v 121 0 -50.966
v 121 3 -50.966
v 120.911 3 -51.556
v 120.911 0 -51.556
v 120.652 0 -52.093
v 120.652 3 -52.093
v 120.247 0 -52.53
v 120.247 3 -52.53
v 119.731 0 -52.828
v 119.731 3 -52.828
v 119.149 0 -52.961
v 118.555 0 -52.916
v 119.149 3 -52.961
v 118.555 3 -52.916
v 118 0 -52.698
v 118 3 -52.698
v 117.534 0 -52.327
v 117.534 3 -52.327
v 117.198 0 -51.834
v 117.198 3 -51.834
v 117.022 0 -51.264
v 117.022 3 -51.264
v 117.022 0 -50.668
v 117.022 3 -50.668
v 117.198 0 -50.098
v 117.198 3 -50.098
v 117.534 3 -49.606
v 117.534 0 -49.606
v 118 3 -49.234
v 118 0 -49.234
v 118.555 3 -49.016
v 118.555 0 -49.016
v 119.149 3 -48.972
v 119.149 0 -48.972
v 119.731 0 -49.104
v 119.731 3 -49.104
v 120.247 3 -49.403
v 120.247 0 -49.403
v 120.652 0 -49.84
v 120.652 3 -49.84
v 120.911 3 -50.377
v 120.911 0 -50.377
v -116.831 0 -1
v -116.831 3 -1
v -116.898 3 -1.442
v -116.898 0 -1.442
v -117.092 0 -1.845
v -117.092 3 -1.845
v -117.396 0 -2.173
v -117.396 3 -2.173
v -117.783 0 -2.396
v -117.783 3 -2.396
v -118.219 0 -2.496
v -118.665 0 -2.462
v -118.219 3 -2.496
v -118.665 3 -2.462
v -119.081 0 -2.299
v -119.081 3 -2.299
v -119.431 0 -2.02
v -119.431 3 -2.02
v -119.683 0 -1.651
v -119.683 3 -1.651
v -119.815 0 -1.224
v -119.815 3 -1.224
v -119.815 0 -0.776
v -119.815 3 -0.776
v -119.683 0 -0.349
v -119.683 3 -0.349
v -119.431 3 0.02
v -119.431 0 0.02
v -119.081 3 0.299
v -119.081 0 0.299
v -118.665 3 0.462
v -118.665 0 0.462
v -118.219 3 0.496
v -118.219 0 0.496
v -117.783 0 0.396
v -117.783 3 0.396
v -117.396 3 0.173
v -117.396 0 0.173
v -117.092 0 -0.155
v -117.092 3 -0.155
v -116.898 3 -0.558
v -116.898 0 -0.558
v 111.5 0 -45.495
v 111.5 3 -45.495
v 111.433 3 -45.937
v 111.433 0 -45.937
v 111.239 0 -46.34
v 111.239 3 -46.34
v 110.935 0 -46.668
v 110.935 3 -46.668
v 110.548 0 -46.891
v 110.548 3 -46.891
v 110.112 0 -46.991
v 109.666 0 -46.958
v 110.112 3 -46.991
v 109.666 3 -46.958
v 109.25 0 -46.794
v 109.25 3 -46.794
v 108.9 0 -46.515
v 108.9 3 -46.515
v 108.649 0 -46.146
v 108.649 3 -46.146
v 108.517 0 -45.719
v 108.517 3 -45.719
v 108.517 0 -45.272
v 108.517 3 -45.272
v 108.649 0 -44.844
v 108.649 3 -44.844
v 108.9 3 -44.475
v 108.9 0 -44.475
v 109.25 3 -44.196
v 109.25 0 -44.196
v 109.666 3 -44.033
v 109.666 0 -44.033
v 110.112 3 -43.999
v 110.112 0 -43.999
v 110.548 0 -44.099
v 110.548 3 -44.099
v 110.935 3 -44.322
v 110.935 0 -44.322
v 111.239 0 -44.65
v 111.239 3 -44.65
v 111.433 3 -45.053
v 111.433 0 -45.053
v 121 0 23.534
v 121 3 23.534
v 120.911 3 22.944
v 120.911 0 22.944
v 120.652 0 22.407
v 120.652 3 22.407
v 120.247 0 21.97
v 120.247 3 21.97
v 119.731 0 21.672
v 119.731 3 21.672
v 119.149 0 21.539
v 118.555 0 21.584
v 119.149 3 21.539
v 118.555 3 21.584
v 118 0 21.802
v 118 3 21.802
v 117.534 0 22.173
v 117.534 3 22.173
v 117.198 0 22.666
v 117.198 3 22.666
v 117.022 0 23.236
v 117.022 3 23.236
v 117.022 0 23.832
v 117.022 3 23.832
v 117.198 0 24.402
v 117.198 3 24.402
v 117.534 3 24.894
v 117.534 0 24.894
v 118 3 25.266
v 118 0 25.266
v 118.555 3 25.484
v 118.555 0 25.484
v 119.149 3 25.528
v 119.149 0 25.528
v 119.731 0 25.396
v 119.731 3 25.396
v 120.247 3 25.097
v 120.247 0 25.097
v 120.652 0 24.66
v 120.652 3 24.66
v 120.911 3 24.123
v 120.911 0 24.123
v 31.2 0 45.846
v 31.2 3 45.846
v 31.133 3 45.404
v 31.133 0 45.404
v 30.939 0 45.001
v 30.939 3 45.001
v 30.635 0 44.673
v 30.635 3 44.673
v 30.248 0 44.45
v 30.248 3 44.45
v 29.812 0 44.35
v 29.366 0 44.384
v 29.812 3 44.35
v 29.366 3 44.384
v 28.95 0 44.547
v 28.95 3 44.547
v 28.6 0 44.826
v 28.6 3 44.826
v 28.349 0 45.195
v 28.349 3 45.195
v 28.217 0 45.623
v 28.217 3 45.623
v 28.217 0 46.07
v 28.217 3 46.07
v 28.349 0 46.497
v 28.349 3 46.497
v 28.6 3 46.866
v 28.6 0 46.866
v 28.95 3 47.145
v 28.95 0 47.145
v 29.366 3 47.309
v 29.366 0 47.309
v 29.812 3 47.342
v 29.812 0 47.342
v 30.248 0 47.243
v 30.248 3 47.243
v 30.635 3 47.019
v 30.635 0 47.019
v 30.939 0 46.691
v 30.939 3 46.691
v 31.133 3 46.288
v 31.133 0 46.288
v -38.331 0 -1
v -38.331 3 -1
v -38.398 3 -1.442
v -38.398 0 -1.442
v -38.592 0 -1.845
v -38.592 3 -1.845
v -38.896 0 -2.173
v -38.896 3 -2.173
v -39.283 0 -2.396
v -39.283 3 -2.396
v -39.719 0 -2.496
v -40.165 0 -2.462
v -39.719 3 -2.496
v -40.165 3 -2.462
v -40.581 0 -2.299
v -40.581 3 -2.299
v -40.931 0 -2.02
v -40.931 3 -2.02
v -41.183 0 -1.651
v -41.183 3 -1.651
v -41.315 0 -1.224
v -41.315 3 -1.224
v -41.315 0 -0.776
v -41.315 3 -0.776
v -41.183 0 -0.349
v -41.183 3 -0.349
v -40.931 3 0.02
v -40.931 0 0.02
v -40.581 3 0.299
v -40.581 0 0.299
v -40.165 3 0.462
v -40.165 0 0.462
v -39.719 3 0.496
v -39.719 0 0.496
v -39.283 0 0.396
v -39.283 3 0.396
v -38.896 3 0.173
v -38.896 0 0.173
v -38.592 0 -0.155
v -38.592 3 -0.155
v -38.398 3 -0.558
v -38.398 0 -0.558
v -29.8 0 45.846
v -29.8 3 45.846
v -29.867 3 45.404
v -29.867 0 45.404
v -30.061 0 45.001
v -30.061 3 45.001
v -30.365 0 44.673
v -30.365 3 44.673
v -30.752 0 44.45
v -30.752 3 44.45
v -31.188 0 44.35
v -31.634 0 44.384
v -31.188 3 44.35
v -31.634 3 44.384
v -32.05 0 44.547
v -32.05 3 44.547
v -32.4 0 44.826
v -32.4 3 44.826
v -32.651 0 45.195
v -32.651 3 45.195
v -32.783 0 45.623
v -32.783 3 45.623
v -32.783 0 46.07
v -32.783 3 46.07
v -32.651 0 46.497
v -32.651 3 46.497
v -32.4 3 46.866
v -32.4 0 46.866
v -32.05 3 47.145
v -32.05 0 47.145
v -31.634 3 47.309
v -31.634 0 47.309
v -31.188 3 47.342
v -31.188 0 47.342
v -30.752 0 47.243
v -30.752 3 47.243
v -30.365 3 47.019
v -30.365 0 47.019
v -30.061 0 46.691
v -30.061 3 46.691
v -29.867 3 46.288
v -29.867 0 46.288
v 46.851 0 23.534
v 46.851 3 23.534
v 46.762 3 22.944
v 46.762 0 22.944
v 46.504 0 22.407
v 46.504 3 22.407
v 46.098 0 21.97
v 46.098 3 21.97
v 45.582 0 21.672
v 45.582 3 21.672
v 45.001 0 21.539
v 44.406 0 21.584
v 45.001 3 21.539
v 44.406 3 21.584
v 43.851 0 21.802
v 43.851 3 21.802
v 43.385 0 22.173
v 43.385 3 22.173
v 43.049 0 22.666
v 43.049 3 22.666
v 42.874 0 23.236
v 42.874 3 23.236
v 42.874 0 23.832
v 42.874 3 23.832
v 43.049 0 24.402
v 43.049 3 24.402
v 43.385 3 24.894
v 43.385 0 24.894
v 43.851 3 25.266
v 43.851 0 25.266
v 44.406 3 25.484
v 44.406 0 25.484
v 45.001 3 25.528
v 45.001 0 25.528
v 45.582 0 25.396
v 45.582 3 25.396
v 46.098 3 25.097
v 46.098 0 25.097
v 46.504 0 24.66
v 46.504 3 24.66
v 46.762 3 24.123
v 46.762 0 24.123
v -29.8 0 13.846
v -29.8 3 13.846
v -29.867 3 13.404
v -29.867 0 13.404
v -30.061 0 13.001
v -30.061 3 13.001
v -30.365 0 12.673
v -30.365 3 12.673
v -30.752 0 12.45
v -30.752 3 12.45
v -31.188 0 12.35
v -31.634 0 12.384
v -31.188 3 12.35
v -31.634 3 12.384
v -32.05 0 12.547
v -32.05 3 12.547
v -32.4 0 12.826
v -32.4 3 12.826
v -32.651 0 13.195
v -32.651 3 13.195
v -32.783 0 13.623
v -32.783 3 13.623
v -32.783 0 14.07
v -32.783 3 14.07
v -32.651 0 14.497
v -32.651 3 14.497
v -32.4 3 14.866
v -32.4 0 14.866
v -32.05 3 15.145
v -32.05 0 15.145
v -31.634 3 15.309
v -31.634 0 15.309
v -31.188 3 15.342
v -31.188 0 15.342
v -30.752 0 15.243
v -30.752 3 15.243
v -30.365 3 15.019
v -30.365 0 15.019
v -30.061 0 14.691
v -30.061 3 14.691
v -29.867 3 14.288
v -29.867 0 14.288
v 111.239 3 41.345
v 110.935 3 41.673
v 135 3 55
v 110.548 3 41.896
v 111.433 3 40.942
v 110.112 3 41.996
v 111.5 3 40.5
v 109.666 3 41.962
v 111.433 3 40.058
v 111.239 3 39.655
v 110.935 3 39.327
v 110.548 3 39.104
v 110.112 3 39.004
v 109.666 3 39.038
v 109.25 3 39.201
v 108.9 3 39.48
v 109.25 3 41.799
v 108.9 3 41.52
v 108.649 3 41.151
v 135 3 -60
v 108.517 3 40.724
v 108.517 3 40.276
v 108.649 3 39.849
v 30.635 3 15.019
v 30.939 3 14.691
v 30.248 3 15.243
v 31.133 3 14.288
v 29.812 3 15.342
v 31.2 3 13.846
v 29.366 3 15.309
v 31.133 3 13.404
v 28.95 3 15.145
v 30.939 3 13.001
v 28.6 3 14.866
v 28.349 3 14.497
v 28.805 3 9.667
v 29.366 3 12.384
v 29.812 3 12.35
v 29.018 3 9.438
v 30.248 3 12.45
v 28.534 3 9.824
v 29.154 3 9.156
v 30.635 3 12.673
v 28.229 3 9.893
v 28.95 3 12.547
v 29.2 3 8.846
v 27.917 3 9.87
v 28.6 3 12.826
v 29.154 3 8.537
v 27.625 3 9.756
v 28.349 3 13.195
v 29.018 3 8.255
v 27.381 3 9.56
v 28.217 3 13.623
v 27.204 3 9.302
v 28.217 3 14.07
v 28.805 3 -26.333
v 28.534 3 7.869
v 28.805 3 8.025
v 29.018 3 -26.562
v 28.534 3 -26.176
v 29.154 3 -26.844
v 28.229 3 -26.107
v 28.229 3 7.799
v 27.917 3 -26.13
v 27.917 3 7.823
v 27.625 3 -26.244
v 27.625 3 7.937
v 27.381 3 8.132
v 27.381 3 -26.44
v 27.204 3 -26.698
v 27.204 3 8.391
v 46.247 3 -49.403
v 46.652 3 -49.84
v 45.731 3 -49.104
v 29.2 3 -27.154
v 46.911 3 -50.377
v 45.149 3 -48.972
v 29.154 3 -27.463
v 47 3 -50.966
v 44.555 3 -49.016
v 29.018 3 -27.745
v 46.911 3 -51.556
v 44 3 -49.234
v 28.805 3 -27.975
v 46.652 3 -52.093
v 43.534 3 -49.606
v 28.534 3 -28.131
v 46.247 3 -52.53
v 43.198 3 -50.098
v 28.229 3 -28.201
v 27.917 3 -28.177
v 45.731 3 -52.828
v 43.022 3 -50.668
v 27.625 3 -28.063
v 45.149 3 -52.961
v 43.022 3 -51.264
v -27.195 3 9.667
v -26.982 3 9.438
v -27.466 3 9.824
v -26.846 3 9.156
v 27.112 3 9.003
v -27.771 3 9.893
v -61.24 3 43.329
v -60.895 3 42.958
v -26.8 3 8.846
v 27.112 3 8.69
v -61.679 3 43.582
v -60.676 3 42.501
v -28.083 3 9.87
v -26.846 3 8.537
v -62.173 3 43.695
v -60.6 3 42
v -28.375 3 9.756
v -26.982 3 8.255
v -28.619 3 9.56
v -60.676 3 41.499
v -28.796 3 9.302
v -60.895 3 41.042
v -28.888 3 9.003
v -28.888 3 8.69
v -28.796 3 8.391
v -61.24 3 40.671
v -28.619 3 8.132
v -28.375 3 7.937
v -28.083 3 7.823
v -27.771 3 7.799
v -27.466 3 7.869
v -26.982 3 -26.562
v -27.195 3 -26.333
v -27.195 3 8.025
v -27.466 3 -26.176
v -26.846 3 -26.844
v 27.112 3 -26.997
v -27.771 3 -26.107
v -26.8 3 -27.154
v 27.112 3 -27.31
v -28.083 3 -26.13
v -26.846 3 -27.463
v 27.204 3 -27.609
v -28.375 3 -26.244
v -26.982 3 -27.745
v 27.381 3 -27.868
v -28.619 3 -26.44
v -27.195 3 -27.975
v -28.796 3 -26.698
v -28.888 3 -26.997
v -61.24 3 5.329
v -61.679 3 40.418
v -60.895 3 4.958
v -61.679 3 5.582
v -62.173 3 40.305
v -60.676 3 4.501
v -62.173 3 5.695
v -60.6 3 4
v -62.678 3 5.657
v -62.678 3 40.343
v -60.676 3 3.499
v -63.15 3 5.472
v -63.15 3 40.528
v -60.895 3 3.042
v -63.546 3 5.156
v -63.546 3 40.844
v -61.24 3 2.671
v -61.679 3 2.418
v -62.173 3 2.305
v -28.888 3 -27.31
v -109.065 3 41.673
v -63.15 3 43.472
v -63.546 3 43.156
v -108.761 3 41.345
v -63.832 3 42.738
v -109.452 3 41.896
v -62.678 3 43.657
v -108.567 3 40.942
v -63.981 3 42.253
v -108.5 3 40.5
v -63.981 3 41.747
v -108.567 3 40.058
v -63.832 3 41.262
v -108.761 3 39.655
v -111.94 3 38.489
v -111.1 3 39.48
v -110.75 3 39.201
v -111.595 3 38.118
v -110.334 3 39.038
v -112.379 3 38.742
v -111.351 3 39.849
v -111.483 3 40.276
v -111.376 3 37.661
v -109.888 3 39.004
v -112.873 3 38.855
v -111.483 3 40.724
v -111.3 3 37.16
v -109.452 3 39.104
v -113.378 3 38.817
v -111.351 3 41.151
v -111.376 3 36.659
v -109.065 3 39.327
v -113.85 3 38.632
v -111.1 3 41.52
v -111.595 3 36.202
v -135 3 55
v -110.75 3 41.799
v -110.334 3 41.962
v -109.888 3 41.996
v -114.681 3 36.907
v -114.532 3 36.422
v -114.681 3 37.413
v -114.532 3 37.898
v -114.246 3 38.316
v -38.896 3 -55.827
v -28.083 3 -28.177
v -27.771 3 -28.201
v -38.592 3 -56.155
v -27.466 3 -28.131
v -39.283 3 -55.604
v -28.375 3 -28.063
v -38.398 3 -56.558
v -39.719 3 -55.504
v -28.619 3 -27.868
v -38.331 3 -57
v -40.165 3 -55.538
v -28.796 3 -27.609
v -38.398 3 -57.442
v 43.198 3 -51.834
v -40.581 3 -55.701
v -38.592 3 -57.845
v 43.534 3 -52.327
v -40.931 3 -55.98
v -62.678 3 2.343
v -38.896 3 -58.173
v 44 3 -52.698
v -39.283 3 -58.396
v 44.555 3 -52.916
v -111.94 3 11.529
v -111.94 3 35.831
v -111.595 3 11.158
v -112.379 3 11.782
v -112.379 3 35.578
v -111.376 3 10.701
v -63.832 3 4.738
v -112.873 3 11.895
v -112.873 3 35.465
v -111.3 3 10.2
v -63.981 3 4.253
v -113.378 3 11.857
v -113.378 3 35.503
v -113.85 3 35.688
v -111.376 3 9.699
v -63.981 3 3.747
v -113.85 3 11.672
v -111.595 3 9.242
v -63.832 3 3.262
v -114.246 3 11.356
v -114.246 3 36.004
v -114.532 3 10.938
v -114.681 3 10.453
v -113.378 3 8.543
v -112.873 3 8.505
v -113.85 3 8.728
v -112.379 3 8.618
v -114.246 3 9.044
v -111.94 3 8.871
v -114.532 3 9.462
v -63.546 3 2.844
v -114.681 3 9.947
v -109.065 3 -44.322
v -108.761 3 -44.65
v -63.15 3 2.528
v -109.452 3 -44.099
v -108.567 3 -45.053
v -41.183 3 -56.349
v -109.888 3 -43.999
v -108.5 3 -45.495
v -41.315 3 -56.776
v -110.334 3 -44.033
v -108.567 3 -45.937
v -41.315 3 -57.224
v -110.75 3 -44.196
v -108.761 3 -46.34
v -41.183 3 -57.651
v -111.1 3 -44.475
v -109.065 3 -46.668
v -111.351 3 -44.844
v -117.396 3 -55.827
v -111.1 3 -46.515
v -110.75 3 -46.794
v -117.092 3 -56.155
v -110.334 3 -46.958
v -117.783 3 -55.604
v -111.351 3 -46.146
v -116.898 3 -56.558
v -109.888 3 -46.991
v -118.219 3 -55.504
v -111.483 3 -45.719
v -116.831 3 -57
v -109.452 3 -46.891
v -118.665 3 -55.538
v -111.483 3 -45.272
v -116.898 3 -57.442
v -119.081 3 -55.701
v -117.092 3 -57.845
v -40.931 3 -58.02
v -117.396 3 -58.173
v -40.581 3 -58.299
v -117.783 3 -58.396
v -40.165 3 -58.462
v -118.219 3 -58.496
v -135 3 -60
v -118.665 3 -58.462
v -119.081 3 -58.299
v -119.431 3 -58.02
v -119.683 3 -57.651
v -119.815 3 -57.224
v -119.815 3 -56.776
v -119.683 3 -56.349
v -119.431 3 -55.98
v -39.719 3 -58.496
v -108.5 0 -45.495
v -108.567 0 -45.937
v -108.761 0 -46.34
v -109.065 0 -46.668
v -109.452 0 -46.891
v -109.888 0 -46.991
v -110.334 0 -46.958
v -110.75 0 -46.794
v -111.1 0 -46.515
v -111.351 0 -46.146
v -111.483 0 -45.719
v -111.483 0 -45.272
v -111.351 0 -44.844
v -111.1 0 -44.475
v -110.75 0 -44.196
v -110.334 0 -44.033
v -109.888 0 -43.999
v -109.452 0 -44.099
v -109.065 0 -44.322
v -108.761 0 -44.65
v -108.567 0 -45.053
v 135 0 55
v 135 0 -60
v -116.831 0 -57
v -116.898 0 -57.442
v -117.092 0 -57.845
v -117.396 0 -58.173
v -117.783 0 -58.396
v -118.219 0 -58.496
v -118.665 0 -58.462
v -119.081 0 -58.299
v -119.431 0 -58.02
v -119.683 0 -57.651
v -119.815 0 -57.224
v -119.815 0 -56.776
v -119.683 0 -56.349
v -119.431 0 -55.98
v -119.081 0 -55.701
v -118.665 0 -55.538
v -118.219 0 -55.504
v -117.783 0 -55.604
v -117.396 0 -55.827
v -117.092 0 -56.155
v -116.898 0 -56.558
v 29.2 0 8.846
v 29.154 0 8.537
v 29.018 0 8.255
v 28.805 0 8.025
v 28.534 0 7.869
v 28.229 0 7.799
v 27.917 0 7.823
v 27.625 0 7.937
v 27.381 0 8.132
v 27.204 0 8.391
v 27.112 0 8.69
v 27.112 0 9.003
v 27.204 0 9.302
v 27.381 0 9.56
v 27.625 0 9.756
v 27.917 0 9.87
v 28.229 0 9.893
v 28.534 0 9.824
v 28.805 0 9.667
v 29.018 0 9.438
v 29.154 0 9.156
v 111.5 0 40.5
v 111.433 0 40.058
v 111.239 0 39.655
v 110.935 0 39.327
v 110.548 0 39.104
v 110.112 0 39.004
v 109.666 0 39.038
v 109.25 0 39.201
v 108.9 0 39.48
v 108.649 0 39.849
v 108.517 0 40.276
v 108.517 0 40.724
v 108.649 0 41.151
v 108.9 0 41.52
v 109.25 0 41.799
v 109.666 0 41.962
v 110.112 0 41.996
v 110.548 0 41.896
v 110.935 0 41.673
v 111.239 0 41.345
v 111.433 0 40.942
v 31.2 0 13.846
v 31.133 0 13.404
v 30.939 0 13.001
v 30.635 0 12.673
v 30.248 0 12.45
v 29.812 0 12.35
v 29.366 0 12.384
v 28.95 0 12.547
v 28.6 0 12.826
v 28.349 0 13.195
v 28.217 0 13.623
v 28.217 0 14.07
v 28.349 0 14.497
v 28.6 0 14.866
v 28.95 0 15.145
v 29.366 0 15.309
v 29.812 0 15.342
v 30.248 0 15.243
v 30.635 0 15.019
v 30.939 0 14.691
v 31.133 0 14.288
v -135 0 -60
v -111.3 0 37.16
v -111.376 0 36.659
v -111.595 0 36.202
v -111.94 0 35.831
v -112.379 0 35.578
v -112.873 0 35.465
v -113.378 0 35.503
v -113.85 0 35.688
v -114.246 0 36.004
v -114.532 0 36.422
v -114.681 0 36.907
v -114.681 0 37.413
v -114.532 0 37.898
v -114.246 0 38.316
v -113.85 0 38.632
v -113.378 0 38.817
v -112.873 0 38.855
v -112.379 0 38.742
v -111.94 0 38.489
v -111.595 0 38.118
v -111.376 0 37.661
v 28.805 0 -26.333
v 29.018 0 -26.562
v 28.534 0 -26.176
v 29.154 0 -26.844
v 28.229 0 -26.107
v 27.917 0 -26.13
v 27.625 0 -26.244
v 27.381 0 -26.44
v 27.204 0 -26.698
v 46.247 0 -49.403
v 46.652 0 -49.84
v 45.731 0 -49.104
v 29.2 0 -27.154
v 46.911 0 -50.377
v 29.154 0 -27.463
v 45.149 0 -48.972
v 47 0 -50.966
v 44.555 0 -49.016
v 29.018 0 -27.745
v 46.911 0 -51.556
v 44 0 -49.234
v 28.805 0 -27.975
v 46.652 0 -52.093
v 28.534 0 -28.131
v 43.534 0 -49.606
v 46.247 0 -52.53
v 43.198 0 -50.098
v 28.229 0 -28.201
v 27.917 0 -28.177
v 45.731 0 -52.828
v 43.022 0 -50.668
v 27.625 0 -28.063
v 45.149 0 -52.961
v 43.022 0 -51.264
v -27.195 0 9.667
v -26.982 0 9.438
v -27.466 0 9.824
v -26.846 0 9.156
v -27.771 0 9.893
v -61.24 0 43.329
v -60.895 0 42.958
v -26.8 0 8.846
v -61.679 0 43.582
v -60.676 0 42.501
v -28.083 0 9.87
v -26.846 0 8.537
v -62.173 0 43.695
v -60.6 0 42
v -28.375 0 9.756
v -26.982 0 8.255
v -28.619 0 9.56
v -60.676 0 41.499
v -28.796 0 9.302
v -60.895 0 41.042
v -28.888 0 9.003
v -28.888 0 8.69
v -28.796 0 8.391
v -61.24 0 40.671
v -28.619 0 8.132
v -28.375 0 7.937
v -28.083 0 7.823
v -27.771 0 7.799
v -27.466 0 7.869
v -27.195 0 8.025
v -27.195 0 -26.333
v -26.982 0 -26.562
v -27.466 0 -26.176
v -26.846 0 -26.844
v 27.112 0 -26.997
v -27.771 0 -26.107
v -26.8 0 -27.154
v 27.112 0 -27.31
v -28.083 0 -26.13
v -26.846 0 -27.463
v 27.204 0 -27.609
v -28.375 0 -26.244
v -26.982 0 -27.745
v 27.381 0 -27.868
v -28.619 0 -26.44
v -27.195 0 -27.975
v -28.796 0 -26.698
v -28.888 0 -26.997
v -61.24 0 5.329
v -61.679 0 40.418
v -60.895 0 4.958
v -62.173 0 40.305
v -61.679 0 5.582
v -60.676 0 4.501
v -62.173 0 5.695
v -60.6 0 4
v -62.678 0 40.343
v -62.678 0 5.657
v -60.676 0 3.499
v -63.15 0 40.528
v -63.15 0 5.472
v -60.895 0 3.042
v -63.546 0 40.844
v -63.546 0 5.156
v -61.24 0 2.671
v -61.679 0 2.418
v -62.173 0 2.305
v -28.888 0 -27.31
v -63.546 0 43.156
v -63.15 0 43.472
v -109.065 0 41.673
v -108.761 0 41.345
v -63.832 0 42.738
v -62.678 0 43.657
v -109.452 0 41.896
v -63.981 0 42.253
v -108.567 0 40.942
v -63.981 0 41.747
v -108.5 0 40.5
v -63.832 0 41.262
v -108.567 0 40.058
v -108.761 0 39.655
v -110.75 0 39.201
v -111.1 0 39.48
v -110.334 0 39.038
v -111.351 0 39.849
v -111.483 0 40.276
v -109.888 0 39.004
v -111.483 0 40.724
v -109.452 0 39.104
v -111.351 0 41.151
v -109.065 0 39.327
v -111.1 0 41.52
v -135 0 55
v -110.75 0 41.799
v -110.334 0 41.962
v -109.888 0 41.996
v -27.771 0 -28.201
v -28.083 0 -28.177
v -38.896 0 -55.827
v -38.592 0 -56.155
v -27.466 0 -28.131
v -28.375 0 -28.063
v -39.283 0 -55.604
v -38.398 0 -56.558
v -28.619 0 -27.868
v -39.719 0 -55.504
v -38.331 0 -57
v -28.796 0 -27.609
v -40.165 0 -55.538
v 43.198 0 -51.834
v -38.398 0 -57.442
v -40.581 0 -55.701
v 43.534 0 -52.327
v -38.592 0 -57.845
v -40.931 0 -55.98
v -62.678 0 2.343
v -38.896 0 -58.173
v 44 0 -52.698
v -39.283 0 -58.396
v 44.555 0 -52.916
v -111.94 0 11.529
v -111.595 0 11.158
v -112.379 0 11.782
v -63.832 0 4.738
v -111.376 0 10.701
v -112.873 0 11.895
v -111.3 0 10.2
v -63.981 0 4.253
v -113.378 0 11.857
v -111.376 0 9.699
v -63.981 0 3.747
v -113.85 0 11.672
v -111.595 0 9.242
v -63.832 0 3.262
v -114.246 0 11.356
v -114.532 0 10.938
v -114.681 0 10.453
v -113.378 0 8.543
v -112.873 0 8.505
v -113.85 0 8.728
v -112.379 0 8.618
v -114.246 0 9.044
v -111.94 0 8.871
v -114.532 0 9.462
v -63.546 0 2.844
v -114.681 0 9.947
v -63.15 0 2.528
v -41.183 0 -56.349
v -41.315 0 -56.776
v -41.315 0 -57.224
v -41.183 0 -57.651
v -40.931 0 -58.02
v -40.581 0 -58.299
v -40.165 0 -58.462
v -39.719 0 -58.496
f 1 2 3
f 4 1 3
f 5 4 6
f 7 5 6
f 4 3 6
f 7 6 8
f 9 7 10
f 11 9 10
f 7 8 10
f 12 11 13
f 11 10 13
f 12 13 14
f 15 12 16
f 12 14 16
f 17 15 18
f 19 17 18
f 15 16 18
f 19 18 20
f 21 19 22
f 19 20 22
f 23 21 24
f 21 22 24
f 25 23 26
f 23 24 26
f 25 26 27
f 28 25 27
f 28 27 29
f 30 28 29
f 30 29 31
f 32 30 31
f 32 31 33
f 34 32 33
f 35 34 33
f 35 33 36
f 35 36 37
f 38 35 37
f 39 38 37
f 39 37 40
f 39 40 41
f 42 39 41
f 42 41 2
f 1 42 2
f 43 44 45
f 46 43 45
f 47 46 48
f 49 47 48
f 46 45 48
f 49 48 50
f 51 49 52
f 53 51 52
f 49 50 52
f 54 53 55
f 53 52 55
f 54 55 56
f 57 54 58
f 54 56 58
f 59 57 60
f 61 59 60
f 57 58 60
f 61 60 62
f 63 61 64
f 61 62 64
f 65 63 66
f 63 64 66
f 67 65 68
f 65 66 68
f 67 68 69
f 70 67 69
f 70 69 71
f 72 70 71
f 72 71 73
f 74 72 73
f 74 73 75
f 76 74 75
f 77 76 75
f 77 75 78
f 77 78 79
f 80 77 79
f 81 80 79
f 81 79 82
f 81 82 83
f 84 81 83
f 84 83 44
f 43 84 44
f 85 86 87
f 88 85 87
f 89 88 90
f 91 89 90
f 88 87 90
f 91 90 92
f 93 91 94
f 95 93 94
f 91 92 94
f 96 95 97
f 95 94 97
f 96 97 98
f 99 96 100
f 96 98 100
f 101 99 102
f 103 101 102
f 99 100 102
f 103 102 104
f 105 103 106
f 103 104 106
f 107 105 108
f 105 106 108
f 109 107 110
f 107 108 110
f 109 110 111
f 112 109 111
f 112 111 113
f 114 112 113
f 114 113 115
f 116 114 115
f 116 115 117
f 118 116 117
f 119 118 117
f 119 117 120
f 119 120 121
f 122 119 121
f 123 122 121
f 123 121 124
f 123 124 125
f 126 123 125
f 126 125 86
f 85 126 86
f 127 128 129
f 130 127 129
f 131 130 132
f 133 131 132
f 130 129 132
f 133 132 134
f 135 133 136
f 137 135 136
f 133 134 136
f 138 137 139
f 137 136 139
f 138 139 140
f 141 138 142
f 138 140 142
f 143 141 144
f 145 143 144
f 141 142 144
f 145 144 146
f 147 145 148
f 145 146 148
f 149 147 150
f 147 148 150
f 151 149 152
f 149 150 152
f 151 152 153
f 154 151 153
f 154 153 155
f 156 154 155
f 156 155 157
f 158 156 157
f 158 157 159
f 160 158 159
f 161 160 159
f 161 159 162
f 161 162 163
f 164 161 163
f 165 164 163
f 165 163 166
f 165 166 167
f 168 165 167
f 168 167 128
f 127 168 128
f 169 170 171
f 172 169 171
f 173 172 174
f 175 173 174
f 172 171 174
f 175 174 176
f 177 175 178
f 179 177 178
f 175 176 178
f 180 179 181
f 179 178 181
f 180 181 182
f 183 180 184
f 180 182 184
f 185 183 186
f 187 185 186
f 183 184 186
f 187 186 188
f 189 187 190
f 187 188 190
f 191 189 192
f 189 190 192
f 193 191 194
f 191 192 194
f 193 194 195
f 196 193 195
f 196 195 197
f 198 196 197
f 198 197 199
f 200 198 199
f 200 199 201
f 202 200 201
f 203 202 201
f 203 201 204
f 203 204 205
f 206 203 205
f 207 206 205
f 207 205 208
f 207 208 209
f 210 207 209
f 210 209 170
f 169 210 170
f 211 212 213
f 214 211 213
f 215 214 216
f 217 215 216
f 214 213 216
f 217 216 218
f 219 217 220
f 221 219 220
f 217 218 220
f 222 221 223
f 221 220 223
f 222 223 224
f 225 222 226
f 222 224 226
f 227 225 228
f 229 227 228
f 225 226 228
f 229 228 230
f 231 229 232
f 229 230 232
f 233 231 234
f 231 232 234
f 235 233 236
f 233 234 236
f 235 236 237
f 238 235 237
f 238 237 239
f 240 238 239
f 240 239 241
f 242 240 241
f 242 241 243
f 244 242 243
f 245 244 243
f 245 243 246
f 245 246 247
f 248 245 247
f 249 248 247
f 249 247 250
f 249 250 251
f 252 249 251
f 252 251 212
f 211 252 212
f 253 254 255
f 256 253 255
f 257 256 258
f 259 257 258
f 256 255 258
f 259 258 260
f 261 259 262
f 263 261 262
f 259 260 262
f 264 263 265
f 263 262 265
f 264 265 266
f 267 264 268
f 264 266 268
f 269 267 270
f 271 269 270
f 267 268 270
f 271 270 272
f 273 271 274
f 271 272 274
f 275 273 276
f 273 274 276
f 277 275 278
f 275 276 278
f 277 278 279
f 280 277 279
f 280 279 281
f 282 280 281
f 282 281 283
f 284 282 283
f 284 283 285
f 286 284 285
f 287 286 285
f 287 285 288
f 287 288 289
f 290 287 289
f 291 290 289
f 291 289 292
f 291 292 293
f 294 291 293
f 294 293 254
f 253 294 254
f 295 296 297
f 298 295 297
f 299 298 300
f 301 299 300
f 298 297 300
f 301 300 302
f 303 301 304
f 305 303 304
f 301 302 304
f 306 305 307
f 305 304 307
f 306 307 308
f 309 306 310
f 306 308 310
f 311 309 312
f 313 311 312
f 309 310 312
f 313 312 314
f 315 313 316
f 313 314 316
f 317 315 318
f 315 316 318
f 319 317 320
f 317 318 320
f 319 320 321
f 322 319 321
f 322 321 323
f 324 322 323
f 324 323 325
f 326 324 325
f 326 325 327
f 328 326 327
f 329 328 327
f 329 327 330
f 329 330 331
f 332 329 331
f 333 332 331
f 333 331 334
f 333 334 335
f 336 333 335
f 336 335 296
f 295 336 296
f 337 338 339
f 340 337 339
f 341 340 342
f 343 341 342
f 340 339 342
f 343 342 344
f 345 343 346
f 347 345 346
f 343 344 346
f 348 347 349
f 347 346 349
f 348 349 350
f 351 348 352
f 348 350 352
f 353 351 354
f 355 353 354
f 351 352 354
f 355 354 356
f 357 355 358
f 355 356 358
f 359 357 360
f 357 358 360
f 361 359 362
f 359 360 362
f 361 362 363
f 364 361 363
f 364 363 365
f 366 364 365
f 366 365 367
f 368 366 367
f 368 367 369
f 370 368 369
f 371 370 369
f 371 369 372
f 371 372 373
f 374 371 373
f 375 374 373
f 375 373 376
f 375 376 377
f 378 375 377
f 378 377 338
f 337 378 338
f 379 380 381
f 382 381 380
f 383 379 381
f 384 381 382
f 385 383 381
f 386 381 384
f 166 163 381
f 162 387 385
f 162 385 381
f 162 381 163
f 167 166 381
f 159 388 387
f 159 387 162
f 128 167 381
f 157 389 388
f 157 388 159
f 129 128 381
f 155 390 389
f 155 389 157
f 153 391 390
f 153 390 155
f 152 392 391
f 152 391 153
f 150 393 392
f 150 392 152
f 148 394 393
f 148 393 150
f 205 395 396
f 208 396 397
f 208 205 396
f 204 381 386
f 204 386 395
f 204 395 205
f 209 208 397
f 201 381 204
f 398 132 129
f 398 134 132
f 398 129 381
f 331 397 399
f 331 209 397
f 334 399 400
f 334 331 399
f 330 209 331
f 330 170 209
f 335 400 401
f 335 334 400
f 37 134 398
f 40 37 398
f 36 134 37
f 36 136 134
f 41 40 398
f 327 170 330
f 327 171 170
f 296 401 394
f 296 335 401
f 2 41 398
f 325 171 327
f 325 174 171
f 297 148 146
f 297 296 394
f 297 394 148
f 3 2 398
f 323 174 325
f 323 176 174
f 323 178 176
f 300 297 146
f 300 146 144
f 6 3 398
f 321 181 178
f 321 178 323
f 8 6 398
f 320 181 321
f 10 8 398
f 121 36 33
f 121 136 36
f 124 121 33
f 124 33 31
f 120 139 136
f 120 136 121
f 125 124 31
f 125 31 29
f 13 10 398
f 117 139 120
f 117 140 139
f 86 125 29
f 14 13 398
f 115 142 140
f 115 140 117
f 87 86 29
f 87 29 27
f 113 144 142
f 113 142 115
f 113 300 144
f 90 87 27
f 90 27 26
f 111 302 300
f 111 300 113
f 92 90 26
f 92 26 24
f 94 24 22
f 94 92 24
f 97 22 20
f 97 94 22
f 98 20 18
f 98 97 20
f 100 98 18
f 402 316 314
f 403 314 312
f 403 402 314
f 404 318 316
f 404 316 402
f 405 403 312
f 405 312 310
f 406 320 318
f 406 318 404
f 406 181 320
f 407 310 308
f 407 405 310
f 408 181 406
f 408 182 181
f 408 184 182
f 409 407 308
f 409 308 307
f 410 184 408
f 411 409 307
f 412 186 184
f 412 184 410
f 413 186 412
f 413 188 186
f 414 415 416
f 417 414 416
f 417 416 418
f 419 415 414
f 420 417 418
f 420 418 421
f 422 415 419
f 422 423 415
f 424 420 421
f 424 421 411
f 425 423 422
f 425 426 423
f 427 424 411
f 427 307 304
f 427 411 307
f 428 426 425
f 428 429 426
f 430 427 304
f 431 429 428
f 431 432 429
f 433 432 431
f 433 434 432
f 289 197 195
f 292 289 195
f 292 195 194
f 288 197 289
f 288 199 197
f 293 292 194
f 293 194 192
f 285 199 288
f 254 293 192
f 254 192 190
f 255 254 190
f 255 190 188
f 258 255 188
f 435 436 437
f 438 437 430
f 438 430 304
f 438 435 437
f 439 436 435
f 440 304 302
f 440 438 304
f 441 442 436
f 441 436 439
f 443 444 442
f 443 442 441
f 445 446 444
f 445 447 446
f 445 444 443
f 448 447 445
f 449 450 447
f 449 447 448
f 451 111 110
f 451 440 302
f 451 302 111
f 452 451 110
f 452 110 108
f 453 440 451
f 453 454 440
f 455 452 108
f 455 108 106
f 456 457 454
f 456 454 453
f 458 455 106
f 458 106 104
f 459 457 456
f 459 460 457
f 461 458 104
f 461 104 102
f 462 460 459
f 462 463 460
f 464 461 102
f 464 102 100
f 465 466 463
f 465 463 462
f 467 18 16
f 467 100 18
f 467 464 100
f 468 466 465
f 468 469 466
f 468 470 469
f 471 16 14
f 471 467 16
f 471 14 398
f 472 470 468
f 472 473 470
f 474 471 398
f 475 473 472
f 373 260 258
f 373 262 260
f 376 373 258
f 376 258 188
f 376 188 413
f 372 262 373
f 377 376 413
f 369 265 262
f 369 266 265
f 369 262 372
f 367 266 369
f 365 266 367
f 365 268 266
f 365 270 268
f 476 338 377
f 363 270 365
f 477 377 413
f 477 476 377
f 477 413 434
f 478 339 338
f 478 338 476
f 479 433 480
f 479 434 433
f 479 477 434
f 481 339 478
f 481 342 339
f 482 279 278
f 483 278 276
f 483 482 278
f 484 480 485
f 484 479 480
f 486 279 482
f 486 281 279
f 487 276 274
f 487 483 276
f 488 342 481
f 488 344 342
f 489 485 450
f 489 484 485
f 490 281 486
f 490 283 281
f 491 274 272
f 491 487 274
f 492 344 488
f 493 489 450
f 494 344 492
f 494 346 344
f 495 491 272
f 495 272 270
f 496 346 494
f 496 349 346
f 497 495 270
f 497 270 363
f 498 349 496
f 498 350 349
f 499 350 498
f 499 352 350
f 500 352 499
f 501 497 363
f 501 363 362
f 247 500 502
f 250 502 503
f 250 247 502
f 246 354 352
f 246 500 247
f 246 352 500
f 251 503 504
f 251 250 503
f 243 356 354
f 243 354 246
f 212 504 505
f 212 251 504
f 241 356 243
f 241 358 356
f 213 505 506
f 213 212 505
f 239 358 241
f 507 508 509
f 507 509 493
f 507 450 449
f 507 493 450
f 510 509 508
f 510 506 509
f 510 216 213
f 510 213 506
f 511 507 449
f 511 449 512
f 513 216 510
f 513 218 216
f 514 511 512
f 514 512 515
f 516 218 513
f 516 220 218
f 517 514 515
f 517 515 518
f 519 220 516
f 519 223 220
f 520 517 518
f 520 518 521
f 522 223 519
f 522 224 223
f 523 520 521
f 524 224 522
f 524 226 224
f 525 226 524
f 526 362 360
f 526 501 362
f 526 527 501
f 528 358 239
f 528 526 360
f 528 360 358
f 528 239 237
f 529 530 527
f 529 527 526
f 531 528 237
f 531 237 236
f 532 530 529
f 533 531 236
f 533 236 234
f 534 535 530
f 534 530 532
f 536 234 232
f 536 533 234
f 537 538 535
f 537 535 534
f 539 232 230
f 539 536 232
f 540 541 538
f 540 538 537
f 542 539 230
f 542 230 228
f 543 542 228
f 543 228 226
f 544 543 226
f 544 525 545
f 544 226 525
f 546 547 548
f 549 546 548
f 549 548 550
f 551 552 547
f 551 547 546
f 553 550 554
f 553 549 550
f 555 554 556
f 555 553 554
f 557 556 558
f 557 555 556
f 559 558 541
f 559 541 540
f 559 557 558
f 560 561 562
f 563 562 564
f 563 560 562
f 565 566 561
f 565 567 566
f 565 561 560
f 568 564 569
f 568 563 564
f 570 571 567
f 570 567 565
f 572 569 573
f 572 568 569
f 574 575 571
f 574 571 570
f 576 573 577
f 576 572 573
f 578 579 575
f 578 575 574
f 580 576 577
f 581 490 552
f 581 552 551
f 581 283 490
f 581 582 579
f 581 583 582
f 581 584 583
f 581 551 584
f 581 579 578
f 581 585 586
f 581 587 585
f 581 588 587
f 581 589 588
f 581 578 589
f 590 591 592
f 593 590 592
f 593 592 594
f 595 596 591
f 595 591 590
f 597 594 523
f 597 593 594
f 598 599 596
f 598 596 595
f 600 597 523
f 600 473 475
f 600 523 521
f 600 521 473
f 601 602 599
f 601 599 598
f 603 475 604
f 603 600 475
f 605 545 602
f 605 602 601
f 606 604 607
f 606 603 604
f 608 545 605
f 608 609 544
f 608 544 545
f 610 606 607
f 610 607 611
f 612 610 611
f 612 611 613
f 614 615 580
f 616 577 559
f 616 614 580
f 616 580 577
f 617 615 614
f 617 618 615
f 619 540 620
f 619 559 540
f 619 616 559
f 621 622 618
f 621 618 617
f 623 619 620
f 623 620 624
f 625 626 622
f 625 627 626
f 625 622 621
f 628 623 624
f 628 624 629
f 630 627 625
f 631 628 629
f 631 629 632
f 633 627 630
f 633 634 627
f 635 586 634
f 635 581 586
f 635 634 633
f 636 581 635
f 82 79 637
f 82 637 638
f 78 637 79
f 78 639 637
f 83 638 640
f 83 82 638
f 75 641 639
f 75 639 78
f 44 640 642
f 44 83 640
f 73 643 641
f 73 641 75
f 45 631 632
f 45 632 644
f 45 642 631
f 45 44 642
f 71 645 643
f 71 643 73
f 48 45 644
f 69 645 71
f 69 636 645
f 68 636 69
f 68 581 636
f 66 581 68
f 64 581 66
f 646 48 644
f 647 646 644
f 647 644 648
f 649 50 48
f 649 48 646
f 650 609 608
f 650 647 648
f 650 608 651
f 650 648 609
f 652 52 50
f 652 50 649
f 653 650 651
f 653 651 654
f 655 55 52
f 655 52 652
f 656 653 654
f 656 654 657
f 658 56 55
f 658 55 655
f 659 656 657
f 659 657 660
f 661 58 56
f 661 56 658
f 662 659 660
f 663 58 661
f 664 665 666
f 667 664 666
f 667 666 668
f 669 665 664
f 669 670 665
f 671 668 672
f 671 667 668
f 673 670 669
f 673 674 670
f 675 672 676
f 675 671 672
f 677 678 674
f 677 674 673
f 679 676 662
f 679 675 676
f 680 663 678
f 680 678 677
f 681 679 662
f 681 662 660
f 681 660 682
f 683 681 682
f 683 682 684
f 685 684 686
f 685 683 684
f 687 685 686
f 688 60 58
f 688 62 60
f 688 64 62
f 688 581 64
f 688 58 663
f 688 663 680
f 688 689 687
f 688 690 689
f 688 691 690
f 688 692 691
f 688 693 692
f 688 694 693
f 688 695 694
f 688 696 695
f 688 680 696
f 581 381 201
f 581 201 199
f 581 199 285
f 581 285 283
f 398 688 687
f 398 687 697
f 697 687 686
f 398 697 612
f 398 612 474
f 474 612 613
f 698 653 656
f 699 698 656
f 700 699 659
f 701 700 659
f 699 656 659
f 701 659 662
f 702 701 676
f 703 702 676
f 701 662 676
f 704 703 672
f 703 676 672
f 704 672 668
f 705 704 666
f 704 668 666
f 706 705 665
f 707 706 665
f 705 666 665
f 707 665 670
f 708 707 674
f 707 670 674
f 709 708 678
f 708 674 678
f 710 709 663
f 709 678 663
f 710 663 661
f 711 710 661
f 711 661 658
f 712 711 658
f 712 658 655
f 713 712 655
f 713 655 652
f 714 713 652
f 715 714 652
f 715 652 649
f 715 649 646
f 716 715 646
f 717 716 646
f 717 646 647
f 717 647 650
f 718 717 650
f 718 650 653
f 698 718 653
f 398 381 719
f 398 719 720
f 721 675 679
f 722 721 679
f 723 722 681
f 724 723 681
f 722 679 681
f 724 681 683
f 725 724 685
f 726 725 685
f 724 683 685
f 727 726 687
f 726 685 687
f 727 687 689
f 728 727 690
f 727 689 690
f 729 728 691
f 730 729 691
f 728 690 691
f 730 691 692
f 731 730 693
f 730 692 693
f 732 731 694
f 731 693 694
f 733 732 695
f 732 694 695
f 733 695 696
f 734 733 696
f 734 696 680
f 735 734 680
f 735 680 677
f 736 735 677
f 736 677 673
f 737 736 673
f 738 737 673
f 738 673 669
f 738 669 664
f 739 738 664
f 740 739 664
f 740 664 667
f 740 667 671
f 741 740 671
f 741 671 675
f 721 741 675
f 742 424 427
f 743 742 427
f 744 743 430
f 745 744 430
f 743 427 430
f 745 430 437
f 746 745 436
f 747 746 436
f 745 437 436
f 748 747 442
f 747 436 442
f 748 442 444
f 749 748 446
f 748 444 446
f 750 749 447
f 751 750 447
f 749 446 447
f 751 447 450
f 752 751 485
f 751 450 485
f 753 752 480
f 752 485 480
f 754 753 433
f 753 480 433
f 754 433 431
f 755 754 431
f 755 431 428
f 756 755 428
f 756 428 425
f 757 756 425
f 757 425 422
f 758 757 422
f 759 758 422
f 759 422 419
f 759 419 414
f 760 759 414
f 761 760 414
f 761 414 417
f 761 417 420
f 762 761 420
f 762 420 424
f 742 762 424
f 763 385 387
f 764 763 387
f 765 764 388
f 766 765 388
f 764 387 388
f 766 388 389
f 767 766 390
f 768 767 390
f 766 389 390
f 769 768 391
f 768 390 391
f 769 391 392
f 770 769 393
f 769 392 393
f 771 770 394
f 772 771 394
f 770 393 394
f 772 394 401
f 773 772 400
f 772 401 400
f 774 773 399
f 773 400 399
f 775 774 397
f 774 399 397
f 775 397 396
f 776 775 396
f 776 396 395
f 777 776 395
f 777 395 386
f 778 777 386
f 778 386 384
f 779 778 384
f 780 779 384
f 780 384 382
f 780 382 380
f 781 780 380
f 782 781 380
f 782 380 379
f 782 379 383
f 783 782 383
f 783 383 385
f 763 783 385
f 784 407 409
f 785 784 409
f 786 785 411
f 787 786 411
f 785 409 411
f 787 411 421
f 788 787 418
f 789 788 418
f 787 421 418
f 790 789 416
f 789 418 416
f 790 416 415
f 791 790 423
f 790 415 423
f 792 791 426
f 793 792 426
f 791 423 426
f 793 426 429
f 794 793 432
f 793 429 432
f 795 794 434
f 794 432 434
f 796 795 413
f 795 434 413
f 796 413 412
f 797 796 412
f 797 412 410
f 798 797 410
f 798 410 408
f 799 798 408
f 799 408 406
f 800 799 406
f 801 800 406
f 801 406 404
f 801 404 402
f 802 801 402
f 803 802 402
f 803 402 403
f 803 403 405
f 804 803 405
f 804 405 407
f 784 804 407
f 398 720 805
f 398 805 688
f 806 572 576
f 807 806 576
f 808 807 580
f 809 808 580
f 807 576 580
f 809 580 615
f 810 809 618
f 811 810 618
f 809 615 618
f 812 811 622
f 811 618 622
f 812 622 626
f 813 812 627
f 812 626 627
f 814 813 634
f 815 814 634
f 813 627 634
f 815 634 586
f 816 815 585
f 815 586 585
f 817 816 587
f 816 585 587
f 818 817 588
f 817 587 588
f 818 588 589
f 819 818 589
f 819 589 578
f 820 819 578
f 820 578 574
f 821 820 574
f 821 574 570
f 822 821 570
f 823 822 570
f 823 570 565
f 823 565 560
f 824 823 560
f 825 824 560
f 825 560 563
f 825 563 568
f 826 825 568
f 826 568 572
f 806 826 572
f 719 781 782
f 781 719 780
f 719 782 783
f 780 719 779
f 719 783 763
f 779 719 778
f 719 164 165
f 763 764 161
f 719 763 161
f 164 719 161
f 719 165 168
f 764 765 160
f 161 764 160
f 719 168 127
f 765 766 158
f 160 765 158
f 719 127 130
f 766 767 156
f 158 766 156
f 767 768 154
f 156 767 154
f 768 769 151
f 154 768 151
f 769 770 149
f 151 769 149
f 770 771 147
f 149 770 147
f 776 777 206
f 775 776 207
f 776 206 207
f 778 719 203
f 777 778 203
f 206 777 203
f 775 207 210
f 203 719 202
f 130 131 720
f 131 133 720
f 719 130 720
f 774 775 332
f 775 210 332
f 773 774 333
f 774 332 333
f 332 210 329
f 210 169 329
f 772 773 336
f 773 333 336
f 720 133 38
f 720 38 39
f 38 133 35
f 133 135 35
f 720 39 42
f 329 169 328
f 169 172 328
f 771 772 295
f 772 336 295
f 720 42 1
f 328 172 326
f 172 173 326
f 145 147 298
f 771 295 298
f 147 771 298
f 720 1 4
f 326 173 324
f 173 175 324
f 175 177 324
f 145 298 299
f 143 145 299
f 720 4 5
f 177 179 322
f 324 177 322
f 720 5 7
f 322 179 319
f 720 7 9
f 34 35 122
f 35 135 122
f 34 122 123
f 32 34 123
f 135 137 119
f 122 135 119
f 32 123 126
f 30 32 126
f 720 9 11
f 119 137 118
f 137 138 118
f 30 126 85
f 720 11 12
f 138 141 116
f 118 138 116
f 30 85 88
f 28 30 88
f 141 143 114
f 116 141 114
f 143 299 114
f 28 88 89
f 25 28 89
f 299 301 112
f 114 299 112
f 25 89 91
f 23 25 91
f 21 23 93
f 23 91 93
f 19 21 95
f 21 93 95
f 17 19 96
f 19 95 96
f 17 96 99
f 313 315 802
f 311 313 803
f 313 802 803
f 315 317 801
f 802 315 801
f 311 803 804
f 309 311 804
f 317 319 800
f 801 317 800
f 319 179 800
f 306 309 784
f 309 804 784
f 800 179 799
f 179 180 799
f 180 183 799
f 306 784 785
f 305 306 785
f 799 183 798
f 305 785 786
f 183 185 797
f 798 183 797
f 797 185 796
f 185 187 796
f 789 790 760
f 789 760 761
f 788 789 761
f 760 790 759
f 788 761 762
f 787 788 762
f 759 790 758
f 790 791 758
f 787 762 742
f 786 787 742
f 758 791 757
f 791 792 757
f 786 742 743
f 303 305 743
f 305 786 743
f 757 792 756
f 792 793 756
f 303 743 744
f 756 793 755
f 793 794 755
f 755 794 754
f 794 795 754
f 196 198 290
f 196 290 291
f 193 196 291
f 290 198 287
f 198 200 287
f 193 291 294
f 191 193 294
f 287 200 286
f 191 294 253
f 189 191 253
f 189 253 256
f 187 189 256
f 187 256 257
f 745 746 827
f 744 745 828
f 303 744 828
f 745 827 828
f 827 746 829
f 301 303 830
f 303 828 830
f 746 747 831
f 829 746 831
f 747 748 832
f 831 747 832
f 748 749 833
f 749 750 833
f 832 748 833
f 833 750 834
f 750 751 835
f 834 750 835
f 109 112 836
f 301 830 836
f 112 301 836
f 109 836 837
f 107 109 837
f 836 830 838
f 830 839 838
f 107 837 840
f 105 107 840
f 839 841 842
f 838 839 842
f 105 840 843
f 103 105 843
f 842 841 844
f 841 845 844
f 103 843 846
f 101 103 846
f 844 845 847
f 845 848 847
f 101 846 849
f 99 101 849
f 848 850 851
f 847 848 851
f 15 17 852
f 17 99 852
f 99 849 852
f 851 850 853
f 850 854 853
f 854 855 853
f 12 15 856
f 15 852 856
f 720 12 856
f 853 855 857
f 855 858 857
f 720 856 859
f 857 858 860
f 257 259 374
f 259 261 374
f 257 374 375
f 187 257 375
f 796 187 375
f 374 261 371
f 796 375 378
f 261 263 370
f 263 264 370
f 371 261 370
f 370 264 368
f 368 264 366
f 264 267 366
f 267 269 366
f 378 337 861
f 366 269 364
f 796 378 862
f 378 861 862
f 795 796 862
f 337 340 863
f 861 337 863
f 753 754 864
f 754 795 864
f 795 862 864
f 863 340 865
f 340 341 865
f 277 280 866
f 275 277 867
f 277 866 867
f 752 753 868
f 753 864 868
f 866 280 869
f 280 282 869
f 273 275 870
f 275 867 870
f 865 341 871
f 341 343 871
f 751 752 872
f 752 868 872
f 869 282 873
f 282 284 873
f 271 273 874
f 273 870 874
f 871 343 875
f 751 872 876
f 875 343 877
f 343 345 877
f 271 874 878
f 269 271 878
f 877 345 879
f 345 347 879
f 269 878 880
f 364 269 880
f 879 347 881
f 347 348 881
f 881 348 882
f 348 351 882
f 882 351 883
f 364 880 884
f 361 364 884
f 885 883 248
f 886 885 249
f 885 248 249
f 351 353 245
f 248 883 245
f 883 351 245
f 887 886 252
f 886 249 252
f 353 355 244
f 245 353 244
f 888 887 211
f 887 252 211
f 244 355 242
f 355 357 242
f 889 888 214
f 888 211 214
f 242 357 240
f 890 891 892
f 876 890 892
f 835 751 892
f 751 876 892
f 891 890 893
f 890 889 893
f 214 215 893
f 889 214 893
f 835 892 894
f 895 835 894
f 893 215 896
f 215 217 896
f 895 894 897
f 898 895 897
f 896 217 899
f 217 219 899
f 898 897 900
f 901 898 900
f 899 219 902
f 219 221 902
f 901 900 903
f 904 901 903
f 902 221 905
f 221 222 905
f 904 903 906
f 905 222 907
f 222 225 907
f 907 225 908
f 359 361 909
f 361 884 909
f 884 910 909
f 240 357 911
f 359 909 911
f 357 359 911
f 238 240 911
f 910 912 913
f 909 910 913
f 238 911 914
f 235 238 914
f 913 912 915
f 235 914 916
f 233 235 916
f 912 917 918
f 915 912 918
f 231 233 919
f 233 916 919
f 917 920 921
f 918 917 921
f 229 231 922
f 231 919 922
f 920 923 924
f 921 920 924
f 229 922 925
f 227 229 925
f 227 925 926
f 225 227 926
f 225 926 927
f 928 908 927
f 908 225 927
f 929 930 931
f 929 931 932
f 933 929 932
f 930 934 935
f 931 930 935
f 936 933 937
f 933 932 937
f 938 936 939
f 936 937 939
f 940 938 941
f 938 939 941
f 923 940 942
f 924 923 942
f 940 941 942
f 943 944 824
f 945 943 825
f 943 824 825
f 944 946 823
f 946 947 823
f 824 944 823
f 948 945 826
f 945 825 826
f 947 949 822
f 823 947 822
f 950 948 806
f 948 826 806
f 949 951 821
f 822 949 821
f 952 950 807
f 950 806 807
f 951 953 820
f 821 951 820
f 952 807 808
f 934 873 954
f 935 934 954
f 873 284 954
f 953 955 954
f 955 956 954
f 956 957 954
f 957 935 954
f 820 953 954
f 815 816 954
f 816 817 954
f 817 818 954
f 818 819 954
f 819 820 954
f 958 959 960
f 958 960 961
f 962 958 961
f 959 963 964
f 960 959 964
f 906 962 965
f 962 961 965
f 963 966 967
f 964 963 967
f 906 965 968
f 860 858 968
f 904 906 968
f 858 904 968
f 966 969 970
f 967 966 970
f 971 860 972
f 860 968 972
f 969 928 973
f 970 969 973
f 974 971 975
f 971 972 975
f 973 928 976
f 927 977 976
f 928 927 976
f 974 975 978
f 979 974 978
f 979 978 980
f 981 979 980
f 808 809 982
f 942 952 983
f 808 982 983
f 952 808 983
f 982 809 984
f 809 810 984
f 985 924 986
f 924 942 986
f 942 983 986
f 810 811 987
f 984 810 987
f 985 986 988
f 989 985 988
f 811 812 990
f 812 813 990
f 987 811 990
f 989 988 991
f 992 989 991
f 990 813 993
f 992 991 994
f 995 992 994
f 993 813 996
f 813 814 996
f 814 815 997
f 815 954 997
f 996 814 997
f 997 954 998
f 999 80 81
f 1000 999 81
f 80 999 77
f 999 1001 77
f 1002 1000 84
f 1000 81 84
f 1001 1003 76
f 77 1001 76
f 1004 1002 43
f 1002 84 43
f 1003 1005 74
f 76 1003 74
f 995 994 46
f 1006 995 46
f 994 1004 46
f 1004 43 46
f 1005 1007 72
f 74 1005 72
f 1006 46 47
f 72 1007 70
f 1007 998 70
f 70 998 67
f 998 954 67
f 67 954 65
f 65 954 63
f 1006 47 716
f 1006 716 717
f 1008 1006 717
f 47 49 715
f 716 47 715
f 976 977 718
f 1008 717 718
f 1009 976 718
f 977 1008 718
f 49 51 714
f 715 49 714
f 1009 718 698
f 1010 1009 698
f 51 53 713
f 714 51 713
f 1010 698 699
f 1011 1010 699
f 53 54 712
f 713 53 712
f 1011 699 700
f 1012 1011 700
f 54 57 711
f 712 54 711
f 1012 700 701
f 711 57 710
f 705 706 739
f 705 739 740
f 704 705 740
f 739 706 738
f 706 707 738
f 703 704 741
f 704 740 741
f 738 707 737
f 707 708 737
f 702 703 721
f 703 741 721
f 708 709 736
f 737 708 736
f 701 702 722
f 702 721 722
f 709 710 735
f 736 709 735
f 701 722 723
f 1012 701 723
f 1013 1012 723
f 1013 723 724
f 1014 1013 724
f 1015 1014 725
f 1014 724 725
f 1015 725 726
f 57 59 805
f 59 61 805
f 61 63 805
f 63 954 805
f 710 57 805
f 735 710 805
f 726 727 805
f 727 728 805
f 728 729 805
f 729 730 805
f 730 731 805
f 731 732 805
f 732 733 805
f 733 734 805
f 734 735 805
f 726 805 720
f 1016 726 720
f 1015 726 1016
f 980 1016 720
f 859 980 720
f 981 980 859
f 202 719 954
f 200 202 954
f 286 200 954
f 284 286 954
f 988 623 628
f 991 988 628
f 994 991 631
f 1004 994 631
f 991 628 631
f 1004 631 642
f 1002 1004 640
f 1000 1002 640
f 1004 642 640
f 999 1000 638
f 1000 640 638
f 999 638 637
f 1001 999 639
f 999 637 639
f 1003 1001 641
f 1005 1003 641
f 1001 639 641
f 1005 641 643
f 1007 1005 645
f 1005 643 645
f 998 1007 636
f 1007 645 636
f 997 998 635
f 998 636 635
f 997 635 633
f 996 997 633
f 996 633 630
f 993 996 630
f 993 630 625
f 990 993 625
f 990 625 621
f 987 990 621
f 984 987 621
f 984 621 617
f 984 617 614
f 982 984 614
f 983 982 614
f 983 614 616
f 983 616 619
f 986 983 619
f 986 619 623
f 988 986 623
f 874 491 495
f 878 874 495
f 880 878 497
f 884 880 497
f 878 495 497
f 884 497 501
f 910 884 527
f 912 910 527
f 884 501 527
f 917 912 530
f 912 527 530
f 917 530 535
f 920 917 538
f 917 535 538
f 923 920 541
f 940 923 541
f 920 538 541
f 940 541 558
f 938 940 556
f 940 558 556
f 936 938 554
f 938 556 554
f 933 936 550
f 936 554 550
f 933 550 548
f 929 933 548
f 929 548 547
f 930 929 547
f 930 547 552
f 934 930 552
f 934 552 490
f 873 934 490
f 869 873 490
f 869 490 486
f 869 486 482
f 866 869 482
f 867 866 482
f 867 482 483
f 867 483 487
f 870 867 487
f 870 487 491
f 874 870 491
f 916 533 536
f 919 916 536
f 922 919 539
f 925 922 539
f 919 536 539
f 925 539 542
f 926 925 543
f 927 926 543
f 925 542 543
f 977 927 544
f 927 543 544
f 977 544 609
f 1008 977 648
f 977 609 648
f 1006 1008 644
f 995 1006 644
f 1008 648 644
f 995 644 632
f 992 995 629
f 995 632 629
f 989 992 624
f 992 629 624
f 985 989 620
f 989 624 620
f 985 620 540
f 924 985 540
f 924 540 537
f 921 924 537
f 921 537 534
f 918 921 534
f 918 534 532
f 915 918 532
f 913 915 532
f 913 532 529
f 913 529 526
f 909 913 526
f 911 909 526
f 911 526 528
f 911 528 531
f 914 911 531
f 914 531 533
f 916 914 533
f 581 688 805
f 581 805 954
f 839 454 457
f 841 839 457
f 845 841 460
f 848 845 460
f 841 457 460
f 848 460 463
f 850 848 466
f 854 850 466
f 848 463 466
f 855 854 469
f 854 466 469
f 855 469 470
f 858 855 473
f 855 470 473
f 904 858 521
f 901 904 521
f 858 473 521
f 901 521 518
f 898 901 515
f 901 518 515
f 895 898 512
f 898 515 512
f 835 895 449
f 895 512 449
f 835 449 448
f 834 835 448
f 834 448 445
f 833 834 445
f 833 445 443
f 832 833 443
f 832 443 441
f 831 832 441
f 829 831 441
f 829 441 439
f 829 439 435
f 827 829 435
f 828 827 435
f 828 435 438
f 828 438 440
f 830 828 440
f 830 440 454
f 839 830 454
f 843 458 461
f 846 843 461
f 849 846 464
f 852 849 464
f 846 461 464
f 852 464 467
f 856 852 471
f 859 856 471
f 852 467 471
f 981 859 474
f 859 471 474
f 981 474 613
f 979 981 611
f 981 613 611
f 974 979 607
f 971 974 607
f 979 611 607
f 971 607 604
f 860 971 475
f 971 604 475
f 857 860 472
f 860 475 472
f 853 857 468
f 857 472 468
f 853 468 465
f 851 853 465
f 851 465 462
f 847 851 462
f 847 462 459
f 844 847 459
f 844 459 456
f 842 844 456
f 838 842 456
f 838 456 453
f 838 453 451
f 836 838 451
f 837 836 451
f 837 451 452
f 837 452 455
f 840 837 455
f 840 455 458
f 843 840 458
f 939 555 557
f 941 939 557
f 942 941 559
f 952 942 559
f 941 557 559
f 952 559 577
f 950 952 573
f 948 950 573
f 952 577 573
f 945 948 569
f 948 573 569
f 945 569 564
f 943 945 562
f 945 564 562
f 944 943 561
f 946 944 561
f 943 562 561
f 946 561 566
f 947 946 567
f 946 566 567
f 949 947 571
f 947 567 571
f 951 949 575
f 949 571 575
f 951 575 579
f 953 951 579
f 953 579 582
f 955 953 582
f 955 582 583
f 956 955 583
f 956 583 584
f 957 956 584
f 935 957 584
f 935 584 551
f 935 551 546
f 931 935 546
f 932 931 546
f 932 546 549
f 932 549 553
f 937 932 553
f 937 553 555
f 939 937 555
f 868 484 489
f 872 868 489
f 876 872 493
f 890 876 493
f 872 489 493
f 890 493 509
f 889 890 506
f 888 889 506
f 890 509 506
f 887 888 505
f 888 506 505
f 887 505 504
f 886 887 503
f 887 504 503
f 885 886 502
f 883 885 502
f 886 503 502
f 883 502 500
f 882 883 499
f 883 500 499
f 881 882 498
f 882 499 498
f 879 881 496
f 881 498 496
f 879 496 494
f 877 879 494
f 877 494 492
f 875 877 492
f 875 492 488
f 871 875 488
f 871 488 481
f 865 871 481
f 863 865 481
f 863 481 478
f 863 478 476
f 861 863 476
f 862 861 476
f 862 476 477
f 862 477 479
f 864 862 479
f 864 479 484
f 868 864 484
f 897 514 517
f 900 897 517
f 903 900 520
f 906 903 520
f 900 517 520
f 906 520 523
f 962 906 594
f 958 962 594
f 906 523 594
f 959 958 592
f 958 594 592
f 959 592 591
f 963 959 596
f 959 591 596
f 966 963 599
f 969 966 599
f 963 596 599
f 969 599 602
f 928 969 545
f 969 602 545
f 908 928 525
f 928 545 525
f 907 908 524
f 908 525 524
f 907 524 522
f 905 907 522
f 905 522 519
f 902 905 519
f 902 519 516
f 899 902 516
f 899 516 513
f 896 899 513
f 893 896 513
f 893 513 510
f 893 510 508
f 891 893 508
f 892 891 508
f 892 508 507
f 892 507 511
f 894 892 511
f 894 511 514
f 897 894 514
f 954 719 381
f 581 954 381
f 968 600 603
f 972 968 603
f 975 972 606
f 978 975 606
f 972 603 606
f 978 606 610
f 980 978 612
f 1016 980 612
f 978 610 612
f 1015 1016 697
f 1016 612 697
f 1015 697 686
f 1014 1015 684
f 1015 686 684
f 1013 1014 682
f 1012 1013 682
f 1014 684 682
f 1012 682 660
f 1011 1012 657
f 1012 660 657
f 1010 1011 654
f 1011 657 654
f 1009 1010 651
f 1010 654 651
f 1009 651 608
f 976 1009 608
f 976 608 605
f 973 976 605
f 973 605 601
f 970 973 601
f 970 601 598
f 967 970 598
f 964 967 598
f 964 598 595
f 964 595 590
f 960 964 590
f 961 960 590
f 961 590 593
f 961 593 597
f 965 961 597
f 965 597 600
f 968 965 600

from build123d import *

# Parameters (mm, degrees)
CROQUIS1_W              = 250
CROQUIS1_H              = 115
SALIENTE_EXTRUIR1_DEPTH = 3
CROQUIS3_R              = 1.5
CROQUIS3_R_2            = 2
CROQUIS3_R_3            = 1.05
CROQUIS3_R_4            = 1.7
CORTAR_EXTRUIR1_DEPTH   = 10
CROQUIS4_W              = 115
CROQUIS4_H              = 3
SALIENTE_EXTRUIR2_DEPTH = 10
CROQUIS5_W              = 115
CROQUIS5_H              = 3
SALIENTE_EXTRUIR3_DEPTH = 10
CROQUIS6_R              = 1.5
CORTAR_EXTRUIR2_DEPTH   = 50


with BuildPart() as part:
    # Croquis1 → Saliente-Extruir1 (new body)
    with BuildSketch(Plane(origin=(0, 0, 0), x_dir=(1, 0, 0), z_dir=(0, 1, 0))):
        with Locations((0, 2.5)):
            Rectangle(CROQUIS1_W, CROQUIS1_H)
    extrude(amount=SALIENTE_EXTRUIR1_DEPTH)

    # Croquis3 → Cortar-Extruir1 (cut)
    with BuildSketch(Plane(origin=(0, 3, 0), x_dir=(1, 0, 0), z_dir=(0, 1, 0))):
        with Locations((-39.831376222, 1)):
            Circle(CROQUIS3_R)
        with Locations((-118.331376222, 1)):
            Circle(CROQUIS3_R)
        with Locations((-118.331376222, 57)):
            Circle(CROQUIS3_R)
        with Locations((-39.831376222, 57)):
            Circle(CROQUIS3_R)
        with Locations((45, 50.966241886)):
            Circle(CROQUIS3_R_2)
        with Locations((119, 50.966241886)):
            Circle(CROQUIS3_R_2)
        with Locations((44.851219877, -23.533758114)):
            Circle(CROQUIS3_R_2)
        with Locations((119, -23.533758114)):
            Circle(CROQUIS3_R_2)
        with Locations((-31.3, -13.846238612)):
            Circle(CROQUIS3_R)
        with Locations((-31.3, -45.846238612)):
            Circle(CROQUIS3_R)
        with Locations((29.7, -45.846238612)):
            Circle(CROQUIS3_R)
        with Locations((29.7, -13.846238612)):
            Circle(CROQUIS3_R)
        with Locations((-27.849623113, 27.153761388)):
            Circle(CROQUIS3_R_3)
        with Locations((-27.849623113, -8.846238612)):
            Circle(CROQUIS3_R_3)
        with Locations((28.150376887, -8.846238612)):
            Circle(CROQUIS3_R_3)
        with Locations((28.150376887, 27.153761388)):
            Circle(CROQUIS3_R_3)
        with Locations((-113, -10.2)):
            Circle(CROQUIS3_R_4)
        with Locations((-113, -37.16)):
            Circle(CROQUIS3_R_4)
        with Locations((-62.3, -4)):
            Circle(CROQUIS3_R_4)
        with Locations((-62.3, -42)):
            Circle(CROQUIS3_R_4)
    extrude(amount=-CORTAR_EXTRUIR1_DEPTH, mode=Mode.SUBTRACT)

    # Croquis4 → Saliente-Extruir2 (add)
    with BuildSketch(Plane.ZY.offset(125)):
        with Locations((-2.5, 1.5)):
            Rectangle(CROQUIS4_W, CROQUIS4_H)
    extrude(amount=SALIENTE_EXTRUIR2_DEPTH)

    # Croquis5 → Saliente-Extruir3 (add)
    with BuildSketch(Plane(origin=(125, 0, 0), x_dir=(0, 0, -1), z_dir=(1, 0, 0))):
        with Locations((2.5, 1.5)):
            Rectangle(CROQUIS5_W, CROQUIS5_H)
    extrude(amount=SALIENTE_EXTRUIR3_DEPTH)

    # Croquis6 → Cortar-Extruir2 (cut)
    with BuildSketch(Plane(origin=(0, 3, 0), x_dir=(1, 0, 0), z_dir=(0, 1, 0))):
        with Locations((-110, 45.495168371)):
            Circle(CROQUIS6_R)
        with Locations((-110, -40.5)):
            Circle(CROQUIS6_R)
        with Locations((110, 45.495168371)):
            Circle(CROQUIS6_R)
        with Locations((110, -40.5)):
            Circle(CROQUIS6_R)
    extrude(amount=-CORTAR_EXTRUIR2_DEPTH, mode=Mode.SUBTRACT)


solid = part.part
